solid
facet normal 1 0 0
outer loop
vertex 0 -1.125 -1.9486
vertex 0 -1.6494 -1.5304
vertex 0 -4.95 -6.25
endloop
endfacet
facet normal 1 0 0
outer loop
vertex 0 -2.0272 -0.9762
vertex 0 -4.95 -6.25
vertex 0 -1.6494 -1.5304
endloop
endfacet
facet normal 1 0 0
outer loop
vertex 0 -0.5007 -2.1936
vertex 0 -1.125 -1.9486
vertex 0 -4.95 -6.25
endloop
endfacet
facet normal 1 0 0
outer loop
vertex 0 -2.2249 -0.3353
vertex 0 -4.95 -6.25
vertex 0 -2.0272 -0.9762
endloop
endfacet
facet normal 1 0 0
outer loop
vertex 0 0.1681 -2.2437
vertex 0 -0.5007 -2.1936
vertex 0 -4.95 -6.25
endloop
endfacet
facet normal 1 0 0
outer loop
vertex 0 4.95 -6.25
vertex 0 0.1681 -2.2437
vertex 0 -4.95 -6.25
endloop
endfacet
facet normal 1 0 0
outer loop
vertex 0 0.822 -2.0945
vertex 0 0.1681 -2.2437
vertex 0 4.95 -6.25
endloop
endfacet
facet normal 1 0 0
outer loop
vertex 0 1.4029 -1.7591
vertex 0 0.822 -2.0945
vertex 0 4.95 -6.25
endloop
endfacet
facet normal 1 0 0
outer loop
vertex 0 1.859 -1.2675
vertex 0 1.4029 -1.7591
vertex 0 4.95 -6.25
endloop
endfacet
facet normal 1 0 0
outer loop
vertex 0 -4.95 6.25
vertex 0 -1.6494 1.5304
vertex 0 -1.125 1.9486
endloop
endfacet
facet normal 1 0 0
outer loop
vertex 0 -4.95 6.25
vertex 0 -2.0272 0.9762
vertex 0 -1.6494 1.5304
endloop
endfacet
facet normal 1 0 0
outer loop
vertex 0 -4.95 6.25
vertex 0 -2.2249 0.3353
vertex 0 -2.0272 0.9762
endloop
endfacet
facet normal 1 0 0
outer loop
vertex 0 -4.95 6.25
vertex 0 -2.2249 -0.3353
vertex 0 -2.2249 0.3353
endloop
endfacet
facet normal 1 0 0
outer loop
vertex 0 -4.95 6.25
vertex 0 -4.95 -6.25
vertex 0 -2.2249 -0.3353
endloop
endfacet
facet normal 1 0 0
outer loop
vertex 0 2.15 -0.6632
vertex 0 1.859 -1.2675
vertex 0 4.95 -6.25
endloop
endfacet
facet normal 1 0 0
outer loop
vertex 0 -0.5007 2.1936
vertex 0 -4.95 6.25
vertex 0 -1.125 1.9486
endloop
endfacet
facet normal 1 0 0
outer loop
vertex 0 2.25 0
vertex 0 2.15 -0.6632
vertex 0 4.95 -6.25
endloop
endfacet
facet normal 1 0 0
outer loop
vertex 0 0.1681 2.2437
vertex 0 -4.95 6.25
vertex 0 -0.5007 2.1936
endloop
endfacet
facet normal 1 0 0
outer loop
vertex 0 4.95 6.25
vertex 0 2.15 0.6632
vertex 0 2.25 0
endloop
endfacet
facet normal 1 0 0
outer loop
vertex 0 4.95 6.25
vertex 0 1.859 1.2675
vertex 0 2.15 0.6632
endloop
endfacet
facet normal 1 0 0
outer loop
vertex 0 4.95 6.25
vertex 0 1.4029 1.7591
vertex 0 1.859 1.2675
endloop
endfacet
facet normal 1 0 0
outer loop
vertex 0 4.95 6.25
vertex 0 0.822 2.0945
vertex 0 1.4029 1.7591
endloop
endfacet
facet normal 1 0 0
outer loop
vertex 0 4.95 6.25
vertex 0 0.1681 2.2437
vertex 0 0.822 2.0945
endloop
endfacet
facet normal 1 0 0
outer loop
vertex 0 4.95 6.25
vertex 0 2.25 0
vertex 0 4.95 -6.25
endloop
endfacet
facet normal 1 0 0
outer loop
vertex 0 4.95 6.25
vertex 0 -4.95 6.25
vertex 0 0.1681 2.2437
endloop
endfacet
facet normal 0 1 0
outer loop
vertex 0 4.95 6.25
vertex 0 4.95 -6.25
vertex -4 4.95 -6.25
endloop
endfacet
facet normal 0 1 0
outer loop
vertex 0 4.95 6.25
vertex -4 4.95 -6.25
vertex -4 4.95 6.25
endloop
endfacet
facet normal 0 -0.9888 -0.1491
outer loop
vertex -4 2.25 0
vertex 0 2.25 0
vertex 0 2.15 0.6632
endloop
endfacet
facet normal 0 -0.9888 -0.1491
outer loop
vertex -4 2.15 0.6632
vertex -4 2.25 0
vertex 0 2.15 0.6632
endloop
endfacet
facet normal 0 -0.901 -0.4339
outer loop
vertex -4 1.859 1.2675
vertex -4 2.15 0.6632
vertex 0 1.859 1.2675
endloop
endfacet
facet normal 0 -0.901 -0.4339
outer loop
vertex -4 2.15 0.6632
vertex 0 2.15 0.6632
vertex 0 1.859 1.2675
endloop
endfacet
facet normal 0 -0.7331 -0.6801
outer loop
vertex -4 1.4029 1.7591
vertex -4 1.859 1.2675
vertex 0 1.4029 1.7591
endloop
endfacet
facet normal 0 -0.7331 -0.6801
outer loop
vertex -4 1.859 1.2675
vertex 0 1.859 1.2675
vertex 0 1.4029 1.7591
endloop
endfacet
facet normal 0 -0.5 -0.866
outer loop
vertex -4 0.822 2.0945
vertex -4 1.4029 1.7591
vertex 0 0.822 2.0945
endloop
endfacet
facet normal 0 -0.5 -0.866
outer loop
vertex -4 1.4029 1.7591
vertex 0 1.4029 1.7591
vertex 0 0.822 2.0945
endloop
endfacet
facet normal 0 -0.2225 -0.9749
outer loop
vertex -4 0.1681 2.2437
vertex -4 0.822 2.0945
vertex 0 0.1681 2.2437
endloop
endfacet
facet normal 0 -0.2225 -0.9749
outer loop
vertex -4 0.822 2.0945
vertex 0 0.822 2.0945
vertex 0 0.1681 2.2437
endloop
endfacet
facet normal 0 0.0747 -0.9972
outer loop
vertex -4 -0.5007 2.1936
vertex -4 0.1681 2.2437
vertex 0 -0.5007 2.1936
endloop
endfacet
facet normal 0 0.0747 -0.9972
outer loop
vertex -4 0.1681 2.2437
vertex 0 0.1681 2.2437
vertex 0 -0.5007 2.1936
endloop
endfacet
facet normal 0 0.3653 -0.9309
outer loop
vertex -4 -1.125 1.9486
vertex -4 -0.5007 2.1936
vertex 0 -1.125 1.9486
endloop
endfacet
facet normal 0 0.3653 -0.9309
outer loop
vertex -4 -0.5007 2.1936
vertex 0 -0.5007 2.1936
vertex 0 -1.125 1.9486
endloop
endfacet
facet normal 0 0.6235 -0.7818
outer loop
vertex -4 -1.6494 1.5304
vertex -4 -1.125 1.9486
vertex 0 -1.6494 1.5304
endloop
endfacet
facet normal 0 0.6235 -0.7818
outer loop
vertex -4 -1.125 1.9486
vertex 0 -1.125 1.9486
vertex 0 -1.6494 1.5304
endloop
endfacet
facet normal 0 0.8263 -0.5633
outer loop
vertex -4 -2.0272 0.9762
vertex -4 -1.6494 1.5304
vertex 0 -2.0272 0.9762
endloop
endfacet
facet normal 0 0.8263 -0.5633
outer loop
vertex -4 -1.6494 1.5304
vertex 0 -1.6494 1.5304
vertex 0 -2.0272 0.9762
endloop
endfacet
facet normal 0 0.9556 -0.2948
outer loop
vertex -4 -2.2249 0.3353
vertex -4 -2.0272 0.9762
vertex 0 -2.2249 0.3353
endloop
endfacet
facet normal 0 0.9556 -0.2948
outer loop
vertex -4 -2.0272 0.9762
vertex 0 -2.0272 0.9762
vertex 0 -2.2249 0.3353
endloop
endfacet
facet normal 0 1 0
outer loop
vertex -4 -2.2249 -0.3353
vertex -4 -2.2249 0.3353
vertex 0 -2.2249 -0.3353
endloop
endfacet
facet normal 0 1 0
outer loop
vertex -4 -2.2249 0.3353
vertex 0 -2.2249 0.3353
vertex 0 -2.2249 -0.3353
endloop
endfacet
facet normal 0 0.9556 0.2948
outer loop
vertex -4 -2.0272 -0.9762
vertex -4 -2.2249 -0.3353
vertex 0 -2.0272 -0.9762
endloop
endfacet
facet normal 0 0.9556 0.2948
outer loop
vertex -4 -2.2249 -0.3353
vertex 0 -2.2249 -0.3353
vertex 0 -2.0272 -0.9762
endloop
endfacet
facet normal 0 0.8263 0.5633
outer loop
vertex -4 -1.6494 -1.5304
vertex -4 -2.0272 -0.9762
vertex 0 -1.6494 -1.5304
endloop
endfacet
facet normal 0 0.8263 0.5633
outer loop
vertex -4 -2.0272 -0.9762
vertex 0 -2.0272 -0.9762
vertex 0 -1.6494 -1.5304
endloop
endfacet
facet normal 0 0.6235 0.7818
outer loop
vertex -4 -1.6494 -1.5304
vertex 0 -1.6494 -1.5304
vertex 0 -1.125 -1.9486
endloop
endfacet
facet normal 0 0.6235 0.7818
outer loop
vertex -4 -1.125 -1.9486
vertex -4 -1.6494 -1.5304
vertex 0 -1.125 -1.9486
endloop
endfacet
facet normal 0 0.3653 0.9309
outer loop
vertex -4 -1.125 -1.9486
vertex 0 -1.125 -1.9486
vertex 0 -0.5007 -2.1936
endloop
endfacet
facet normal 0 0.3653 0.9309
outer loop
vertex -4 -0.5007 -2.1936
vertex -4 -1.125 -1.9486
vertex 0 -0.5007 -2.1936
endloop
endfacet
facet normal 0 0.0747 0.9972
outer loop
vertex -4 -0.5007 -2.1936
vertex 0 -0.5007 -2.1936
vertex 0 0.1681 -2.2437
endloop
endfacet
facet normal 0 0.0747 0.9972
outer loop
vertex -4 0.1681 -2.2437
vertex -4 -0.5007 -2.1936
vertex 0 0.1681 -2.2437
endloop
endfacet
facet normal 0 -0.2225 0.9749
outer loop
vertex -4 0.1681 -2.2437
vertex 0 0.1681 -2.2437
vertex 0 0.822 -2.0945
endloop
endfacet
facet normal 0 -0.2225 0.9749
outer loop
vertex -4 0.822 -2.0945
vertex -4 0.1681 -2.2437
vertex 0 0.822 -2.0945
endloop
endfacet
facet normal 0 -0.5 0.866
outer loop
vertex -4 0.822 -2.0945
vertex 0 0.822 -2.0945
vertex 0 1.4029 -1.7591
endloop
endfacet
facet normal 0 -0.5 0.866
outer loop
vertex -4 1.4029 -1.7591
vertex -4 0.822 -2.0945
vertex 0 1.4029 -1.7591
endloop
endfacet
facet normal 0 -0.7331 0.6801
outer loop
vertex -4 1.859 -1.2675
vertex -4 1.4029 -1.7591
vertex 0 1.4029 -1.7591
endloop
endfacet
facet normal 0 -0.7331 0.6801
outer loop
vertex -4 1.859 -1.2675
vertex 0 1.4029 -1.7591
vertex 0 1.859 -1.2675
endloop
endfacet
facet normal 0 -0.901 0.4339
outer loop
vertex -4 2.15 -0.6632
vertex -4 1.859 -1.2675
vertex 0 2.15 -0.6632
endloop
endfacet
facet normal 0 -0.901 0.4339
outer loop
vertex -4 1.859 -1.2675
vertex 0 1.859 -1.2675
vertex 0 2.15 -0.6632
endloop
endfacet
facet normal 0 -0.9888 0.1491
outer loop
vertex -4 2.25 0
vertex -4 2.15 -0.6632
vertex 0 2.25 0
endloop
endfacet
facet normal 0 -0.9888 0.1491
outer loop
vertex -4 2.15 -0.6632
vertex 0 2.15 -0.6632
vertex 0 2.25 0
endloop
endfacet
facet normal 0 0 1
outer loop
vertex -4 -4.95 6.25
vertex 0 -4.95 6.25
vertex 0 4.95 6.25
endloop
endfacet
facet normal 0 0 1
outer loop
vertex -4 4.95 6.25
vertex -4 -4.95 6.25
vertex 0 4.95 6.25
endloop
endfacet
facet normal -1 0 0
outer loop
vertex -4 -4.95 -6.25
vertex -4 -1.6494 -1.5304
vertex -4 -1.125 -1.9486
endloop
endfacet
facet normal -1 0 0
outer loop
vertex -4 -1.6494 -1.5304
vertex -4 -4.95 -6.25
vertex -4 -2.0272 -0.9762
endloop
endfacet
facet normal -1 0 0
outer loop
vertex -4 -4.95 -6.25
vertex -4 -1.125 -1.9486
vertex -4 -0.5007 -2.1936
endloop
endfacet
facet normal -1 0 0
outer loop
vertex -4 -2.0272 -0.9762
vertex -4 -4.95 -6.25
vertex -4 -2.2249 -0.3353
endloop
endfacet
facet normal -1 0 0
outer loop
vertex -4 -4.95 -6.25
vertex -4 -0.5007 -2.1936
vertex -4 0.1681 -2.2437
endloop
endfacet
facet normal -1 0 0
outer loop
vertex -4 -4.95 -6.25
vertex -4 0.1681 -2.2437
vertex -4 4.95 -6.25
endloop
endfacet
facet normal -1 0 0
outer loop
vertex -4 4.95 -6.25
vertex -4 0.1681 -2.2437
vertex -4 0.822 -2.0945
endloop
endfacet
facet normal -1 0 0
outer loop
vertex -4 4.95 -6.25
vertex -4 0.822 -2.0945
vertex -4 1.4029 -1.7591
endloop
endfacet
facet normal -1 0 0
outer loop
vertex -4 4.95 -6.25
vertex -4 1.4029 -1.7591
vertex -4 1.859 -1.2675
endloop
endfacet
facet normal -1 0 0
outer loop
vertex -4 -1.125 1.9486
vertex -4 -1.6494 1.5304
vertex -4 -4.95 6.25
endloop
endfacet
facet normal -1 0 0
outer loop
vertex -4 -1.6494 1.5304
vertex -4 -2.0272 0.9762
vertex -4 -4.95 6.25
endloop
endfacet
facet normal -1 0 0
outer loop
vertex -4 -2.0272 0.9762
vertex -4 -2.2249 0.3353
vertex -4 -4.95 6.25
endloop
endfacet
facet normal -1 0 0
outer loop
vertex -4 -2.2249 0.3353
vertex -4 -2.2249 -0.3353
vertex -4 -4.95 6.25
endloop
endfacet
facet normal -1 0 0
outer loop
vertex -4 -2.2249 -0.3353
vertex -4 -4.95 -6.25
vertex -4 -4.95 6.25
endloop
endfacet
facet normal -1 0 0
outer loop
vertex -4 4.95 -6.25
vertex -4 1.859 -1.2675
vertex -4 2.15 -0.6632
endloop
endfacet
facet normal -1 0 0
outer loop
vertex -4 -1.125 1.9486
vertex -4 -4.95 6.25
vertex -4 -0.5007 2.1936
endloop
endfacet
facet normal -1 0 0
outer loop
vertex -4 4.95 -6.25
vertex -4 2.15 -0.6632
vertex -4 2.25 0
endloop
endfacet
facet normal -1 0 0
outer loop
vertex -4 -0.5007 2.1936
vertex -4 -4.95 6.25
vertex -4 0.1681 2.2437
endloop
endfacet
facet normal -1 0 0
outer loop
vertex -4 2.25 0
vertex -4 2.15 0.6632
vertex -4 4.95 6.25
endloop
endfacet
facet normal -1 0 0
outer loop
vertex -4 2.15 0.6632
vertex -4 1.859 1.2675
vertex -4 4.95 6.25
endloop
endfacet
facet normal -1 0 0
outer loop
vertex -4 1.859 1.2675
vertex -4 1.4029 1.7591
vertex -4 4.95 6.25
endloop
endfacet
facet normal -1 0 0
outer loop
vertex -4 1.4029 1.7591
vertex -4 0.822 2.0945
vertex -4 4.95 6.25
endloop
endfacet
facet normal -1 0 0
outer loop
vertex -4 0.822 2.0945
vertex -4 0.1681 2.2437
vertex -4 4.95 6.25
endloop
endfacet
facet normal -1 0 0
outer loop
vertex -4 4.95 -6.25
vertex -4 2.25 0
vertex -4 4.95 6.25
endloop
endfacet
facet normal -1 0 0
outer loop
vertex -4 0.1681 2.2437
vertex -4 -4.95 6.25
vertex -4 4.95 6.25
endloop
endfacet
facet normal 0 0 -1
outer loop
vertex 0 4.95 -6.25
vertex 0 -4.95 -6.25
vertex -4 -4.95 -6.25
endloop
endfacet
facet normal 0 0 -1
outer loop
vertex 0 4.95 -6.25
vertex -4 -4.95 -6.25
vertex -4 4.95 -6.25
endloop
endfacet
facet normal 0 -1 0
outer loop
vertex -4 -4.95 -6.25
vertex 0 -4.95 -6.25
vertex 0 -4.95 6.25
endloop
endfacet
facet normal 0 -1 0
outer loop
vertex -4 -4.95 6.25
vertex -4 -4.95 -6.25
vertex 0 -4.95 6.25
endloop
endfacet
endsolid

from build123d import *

# Parameters (mm, degrees)
F0_W     = 9.9
F0_H     = 12.5
F0_R     = 2.25
F1_DEPTH = 4


with BuildPart() as f1:
    # F0 (on Right) → F1 (new body)
    with BuildSketch(Plane.YZ):
        Rectangle(F0_W, F0_H)
        Circle(F0_R, mode=Mode.SUBTRACT)
    extrude(amount=-F1_DEPTH)


solid = f1.part
